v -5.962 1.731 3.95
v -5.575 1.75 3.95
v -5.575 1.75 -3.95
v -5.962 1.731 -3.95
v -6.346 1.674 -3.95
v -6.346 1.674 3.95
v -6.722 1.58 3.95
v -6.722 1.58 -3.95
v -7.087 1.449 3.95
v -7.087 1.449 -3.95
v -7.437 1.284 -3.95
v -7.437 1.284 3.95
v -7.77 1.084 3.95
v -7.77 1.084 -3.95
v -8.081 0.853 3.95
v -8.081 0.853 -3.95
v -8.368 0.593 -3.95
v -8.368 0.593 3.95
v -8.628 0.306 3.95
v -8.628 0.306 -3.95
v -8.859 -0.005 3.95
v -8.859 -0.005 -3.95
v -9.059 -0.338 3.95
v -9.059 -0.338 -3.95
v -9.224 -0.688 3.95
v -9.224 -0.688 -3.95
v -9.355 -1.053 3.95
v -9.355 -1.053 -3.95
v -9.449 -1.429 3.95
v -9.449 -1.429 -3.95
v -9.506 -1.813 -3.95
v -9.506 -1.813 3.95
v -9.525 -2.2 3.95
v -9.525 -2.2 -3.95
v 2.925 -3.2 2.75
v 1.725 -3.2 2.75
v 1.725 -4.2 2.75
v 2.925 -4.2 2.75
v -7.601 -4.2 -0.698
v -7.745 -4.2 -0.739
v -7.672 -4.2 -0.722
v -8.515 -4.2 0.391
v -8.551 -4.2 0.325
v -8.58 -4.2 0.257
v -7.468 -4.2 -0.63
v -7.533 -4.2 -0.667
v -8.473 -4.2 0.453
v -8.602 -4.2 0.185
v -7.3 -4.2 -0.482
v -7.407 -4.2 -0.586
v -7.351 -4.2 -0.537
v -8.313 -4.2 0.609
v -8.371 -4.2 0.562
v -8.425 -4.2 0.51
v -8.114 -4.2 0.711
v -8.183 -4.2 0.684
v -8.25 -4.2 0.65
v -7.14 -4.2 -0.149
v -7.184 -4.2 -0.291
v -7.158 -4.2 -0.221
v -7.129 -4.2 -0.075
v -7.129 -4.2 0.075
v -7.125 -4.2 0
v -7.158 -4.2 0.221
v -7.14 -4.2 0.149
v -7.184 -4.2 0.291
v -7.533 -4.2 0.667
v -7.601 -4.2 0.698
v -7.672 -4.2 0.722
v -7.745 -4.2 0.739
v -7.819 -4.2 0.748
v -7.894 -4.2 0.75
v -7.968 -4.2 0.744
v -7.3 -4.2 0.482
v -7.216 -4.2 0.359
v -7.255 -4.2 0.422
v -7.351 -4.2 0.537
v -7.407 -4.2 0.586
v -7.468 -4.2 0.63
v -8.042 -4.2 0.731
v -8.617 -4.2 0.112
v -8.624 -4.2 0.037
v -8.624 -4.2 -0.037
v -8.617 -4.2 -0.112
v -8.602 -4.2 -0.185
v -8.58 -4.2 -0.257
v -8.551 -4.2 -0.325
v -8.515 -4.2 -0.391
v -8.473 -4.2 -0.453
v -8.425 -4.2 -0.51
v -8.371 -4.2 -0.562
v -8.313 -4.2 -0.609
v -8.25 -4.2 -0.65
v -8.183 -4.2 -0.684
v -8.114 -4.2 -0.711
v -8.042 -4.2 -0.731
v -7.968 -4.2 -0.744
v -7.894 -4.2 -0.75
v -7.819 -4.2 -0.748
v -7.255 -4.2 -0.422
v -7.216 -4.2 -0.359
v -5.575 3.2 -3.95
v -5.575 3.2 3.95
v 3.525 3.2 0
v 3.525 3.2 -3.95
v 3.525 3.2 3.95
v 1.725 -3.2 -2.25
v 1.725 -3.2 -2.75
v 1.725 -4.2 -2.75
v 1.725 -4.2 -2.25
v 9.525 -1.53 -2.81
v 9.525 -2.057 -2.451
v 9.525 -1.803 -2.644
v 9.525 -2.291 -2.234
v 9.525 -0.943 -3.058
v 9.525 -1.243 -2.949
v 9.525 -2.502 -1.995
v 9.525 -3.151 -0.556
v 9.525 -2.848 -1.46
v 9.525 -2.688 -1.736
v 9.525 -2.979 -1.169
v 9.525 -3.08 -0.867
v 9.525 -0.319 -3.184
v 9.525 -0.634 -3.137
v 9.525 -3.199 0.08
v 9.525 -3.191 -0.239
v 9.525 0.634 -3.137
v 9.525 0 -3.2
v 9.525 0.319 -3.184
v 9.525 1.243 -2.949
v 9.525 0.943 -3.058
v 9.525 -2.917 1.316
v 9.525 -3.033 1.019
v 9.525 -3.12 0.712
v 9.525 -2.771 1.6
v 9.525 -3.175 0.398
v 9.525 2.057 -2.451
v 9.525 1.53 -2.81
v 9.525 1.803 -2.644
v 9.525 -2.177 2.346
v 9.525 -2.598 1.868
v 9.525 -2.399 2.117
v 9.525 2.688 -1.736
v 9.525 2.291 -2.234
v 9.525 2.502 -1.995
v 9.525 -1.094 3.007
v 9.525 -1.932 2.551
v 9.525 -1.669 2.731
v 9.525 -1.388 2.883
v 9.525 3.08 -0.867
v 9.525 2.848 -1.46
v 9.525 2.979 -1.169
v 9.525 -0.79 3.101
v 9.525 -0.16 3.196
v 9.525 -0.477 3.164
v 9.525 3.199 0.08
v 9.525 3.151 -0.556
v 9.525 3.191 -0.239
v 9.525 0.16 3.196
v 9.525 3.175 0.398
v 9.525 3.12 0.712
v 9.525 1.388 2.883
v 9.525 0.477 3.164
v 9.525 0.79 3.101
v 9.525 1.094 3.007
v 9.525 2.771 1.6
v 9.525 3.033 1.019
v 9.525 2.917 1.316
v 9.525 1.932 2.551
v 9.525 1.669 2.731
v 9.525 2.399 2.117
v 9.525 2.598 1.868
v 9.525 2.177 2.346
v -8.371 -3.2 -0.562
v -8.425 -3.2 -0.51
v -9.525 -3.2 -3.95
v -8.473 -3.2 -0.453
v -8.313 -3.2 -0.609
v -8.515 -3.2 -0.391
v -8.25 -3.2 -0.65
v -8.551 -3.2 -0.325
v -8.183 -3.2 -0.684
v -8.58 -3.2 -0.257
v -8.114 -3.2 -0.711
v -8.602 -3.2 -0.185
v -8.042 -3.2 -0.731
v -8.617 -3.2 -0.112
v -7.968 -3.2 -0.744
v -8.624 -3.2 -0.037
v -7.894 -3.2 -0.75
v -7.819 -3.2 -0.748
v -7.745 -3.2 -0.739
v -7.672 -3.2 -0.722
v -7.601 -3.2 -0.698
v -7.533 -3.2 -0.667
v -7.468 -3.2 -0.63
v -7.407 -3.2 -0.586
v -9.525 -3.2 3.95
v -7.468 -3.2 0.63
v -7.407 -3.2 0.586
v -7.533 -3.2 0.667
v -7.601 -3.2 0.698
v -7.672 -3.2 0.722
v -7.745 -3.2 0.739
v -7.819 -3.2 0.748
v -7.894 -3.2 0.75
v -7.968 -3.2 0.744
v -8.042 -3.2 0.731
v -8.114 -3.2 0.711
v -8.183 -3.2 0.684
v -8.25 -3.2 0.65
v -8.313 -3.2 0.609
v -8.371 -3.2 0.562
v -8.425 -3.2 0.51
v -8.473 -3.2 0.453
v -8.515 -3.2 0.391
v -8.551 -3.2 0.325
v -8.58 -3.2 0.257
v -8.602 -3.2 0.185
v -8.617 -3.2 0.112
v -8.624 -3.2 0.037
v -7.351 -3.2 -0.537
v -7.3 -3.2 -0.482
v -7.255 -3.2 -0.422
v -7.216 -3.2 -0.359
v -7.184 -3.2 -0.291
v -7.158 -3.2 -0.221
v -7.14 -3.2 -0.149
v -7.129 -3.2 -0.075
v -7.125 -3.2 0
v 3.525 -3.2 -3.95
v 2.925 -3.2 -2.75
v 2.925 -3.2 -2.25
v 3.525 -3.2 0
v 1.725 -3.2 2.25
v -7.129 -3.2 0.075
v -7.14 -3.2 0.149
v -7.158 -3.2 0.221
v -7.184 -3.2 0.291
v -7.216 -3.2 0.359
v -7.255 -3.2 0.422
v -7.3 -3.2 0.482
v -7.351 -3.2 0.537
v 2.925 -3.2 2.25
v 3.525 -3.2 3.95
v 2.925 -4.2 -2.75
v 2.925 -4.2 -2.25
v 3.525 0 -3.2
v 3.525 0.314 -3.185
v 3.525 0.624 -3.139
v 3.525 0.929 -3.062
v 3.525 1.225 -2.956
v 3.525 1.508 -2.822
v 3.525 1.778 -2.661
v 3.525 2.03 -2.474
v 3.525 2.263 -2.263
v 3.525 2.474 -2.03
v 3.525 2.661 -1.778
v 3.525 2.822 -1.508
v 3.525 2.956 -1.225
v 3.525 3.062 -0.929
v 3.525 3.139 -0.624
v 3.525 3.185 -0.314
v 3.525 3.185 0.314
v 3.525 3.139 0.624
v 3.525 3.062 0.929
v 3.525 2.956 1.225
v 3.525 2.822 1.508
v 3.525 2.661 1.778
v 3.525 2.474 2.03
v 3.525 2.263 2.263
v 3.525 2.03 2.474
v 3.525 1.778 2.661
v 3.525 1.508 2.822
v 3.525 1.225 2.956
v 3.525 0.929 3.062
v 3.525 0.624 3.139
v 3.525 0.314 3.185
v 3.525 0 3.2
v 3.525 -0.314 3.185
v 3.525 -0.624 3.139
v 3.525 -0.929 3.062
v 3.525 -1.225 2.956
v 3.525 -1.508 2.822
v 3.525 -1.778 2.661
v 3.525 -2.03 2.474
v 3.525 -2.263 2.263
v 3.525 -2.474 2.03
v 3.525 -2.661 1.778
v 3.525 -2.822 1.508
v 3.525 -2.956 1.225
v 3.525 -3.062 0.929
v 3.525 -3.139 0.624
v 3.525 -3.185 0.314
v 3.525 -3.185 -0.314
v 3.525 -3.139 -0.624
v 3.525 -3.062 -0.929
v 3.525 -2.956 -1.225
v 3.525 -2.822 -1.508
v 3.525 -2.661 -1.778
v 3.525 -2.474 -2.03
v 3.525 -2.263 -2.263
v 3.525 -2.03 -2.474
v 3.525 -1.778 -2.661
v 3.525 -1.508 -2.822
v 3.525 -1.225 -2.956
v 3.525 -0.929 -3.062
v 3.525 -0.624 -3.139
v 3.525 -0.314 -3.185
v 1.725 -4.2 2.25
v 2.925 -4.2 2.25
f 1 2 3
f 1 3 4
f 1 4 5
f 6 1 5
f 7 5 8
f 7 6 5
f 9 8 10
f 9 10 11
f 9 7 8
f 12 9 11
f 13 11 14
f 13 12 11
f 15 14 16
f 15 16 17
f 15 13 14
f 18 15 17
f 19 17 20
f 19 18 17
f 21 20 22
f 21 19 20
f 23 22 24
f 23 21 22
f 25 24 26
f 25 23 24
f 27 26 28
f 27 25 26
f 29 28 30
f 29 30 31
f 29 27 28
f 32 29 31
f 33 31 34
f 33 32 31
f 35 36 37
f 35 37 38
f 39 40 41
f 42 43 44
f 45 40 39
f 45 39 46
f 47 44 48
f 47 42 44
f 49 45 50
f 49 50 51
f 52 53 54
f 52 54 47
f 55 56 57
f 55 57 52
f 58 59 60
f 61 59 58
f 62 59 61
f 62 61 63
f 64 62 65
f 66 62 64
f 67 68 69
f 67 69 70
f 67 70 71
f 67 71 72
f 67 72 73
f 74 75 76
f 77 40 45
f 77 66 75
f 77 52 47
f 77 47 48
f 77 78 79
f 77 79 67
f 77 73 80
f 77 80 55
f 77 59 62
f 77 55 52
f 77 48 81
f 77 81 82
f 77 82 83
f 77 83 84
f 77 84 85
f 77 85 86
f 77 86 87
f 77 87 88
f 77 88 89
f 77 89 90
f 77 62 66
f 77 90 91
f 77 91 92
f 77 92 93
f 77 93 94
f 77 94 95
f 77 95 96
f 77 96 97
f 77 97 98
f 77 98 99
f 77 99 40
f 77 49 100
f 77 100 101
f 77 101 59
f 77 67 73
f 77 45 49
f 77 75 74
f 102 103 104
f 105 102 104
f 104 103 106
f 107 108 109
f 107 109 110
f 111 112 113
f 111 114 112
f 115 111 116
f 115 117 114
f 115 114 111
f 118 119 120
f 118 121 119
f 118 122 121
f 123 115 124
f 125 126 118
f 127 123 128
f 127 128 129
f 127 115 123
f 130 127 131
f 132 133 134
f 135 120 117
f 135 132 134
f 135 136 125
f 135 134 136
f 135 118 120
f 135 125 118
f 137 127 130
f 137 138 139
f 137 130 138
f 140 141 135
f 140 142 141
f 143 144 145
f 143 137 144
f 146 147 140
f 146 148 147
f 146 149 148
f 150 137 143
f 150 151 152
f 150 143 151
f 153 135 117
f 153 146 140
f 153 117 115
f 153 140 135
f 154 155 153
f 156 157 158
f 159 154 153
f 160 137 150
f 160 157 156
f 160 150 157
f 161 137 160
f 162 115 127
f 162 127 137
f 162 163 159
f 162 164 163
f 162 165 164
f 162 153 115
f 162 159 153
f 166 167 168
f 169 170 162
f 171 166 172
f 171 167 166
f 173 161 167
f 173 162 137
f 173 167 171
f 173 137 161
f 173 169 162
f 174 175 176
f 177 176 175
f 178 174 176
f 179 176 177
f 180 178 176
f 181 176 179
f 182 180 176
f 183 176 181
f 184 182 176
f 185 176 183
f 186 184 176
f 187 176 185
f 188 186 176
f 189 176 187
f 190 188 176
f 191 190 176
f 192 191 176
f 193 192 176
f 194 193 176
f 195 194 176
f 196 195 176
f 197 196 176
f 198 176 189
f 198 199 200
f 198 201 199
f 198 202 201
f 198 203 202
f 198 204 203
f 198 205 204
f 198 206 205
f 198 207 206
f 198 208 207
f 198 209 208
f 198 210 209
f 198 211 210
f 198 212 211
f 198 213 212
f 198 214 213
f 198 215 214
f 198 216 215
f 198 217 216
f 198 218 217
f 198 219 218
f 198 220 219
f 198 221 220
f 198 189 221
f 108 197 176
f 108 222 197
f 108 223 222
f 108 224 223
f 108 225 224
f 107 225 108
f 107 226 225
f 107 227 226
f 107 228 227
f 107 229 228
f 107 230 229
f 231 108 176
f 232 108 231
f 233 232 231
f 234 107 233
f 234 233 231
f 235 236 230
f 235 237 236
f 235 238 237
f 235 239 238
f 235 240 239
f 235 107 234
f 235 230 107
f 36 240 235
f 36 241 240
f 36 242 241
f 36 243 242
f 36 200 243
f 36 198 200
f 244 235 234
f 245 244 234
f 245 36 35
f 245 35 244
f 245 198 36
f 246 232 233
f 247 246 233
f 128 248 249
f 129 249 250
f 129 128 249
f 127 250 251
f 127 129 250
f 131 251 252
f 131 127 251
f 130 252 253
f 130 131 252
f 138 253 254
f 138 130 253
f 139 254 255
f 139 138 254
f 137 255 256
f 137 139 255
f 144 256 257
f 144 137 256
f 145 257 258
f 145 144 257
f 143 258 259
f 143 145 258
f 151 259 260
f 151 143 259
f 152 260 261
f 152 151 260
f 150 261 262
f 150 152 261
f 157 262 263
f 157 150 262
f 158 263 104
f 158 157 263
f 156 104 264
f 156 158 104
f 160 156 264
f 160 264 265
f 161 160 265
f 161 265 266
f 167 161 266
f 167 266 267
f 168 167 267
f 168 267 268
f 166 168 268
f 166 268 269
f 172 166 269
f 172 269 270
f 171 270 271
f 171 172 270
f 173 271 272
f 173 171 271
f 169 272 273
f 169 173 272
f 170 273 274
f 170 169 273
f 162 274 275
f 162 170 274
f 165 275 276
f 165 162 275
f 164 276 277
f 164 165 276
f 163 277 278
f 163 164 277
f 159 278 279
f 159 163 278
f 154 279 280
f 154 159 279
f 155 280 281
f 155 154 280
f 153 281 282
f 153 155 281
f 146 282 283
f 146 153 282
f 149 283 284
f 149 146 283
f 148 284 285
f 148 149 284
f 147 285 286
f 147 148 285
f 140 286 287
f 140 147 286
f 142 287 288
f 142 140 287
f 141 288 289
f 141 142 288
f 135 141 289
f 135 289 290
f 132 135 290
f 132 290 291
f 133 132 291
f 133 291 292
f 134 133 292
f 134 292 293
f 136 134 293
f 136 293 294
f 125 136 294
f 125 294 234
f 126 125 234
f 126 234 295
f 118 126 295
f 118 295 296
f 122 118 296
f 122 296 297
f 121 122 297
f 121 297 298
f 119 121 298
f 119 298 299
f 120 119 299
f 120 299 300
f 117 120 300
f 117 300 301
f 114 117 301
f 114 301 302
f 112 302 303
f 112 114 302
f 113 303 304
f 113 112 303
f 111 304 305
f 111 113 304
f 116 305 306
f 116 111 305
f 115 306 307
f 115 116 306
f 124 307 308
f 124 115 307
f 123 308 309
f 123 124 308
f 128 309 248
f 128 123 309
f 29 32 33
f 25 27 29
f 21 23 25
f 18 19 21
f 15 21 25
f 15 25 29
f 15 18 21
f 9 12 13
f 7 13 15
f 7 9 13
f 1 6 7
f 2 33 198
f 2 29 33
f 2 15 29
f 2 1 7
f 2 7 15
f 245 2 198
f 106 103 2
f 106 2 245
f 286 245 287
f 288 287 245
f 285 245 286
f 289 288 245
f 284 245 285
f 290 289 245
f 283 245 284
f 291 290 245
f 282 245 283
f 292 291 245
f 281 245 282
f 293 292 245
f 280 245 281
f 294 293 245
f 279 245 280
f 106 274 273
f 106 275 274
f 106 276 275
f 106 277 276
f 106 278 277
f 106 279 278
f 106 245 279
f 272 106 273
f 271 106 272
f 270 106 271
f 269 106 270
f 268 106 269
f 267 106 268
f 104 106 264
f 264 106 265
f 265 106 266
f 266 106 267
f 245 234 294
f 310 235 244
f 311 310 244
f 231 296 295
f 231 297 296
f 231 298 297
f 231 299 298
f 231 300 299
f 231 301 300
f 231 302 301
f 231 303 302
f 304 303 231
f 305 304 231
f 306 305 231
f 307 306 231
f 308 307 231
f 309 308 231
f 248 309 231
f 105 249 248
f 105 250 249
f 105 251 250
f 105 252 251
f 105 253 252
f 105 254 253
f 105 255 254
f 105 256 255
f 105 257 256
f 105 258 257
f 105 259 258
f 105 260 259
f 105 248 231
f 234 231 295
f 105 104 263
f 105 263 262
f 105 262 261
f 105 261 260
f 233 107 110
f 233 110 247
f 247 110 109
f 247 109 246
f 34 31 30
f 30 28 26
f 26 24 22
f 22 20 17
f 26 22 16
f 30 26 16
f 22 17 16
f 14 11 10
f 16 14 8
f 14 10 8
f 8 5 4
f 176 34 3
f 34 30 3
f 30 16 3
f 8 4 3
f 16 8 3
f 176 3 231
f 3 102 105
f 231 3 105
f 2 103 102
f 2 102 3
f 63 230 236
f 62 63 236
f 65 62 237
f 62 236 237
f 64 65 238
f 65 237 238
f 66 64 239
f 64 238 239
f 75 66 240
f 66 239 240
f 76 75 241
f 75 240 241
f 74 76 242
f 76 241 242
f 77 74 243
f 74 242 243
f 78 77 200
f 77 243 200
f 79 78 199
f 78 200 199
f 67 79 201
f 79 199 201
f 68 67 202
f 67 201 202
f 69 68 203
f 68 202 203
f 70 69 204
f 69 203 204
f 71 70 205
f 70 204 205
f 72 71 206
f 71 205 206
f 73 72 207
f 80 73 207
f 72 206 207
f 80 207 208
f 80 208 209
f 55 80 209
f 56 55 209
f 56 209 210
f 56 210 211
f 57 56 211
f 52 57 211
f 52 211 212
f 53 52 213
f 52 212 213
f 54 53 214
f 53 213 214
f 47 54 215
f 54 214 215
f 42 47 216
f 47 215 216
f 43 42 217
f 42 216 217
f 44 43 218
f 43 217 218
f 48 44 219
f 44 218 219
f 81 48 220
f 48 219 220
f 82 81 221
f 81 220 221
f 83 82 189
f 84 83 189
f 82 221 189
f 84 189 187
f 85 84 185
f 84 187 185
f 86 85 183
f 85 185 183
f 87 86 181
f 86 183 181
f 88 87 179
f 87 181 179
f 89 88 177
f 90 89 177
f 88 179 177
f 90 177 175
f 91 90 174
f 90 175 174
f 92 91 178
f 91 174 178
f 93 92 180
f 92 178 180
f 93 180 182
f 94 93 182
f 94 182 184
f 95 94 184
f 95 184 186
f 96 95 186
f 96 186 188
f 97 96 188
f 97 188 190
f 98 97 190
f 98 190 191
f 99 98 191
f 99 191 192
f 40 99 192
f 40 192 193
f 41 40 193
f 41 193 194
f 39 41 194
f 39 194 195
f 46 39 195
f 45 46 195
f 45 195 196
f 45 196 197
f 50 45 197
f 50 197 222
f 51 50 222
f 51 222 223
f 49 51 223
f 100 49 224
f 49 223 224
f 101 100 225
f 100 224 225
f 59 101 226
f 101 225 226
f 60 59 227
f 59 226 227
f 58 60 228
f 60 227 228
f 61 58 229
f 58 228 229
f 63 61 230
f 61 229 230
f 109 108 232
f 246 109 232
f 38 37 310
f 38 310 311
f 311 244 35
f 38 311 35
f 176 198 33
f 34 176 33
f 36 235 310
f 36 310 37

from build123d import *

# Parameters (mm, degrees)
SKETCH1_W               = 19.05
SKETCH1_H               = 6.4
BOSS_EXTRUDE1_DEPTH     = 3.95
SKETCH2_OUTSIDE_W       = 14.218
SKETCH2_OUTSIDE_H       = 12.718
SKETCH2_OUTSIDE_R       = 3.2
CUT_EXTRUDE1_DEPTH      = 6
SKETCH3_R               = 0.75
SKETCH3_W               = 1.2
SKETCH3_H               = 0.5
BOSS_EXTRUDE2_DEPTH     = 1
CUT_EXTRUDE2_DEPTH      = 1
CUT_EXTRUDE2_DEPTH_BACK = 8.9


with BuildPart() as part:
    # Sketch1 → Boss-Extrude1 (new body, symmetric)
    with BuildSketch(Plane.XY):
        Rectangle(SKETCH1_W, SKETCH1_H)
    extrude(amount=BOSS_EXTRUDE1_DEPTH, both=True)

    # Sketch2 outside → Cut-Extrude1 (cut)
    with BuildSketch(Plane(origin=(9.525, 0, 0), x_dir=(0, 0, -1), z_dir=(1, 0, 0))):
        Rectangle(SKETCH2_OUTSIDE_W, SKETCH2_OUTSIDE_H)
        Circle(SKETCH2_OUTSIDE_R, mode=Mode.SUBTRACT)
    extrude(amount=-CUT_EXTRUDE1_DEPTH, mode=Mode.SUBTRACT)

    # Sketch3 → Boss-Extrude2 (add)
    with BuildSketch(Plane.XZ.offset(3.2)):
        with Locations((-7.875, 0)):
            Circle(SKETCH3_R)
        with Locations((2.325, 2.5)):
            Rectangle(SKETCH3_W, SKETCH3_H)
        with Locations((2.325, -2.5)):
            Rectangle(SKETCH3_W, SKETCH3_H)
    extrude(amount=BOSS_EXTRUDE2_DEPTH)

    # Sketch5 → Cut-Extrude2 (cut, two sides)
    with BuildSketch(Plane.XY.offset(3.95)) as cut_extrude2_sk:
        with BuildLine():
            Line((-5.575, 53.392661022), (-5.575, 3.2))
            Line((-5.575, 3.2), (-5.575, 1.75))
            ThreePointArc((-5.575, 1.75), (-8.368071786, 0.593071786), (-9.525, -2.2))
            Line((-9.525, -2.2), (-9.525, -3.2))
            Line((-9.525, -3.2), (-9.525, -53.392661022))
            Line((-9.525, -53.392661022), (-109.841715444, -49.681935442))
            Line((-109.841715444, -49.681935442), (-105.891715444, 57.103386601))
            Line((-105.891715444, 57.103386601), (-5.575, 53.392661022))
        make_face()
    extrude(amount=CUT_EXTRUDE2_DEPTH, mode=Mode.SUBTRACT)
    extrude(cut_extrude2_sk.sketch, amount=-CUT_EXTRUDE2_DEPTH_BACK, mode=Mode.SUBTRACT)


solid = part.part
